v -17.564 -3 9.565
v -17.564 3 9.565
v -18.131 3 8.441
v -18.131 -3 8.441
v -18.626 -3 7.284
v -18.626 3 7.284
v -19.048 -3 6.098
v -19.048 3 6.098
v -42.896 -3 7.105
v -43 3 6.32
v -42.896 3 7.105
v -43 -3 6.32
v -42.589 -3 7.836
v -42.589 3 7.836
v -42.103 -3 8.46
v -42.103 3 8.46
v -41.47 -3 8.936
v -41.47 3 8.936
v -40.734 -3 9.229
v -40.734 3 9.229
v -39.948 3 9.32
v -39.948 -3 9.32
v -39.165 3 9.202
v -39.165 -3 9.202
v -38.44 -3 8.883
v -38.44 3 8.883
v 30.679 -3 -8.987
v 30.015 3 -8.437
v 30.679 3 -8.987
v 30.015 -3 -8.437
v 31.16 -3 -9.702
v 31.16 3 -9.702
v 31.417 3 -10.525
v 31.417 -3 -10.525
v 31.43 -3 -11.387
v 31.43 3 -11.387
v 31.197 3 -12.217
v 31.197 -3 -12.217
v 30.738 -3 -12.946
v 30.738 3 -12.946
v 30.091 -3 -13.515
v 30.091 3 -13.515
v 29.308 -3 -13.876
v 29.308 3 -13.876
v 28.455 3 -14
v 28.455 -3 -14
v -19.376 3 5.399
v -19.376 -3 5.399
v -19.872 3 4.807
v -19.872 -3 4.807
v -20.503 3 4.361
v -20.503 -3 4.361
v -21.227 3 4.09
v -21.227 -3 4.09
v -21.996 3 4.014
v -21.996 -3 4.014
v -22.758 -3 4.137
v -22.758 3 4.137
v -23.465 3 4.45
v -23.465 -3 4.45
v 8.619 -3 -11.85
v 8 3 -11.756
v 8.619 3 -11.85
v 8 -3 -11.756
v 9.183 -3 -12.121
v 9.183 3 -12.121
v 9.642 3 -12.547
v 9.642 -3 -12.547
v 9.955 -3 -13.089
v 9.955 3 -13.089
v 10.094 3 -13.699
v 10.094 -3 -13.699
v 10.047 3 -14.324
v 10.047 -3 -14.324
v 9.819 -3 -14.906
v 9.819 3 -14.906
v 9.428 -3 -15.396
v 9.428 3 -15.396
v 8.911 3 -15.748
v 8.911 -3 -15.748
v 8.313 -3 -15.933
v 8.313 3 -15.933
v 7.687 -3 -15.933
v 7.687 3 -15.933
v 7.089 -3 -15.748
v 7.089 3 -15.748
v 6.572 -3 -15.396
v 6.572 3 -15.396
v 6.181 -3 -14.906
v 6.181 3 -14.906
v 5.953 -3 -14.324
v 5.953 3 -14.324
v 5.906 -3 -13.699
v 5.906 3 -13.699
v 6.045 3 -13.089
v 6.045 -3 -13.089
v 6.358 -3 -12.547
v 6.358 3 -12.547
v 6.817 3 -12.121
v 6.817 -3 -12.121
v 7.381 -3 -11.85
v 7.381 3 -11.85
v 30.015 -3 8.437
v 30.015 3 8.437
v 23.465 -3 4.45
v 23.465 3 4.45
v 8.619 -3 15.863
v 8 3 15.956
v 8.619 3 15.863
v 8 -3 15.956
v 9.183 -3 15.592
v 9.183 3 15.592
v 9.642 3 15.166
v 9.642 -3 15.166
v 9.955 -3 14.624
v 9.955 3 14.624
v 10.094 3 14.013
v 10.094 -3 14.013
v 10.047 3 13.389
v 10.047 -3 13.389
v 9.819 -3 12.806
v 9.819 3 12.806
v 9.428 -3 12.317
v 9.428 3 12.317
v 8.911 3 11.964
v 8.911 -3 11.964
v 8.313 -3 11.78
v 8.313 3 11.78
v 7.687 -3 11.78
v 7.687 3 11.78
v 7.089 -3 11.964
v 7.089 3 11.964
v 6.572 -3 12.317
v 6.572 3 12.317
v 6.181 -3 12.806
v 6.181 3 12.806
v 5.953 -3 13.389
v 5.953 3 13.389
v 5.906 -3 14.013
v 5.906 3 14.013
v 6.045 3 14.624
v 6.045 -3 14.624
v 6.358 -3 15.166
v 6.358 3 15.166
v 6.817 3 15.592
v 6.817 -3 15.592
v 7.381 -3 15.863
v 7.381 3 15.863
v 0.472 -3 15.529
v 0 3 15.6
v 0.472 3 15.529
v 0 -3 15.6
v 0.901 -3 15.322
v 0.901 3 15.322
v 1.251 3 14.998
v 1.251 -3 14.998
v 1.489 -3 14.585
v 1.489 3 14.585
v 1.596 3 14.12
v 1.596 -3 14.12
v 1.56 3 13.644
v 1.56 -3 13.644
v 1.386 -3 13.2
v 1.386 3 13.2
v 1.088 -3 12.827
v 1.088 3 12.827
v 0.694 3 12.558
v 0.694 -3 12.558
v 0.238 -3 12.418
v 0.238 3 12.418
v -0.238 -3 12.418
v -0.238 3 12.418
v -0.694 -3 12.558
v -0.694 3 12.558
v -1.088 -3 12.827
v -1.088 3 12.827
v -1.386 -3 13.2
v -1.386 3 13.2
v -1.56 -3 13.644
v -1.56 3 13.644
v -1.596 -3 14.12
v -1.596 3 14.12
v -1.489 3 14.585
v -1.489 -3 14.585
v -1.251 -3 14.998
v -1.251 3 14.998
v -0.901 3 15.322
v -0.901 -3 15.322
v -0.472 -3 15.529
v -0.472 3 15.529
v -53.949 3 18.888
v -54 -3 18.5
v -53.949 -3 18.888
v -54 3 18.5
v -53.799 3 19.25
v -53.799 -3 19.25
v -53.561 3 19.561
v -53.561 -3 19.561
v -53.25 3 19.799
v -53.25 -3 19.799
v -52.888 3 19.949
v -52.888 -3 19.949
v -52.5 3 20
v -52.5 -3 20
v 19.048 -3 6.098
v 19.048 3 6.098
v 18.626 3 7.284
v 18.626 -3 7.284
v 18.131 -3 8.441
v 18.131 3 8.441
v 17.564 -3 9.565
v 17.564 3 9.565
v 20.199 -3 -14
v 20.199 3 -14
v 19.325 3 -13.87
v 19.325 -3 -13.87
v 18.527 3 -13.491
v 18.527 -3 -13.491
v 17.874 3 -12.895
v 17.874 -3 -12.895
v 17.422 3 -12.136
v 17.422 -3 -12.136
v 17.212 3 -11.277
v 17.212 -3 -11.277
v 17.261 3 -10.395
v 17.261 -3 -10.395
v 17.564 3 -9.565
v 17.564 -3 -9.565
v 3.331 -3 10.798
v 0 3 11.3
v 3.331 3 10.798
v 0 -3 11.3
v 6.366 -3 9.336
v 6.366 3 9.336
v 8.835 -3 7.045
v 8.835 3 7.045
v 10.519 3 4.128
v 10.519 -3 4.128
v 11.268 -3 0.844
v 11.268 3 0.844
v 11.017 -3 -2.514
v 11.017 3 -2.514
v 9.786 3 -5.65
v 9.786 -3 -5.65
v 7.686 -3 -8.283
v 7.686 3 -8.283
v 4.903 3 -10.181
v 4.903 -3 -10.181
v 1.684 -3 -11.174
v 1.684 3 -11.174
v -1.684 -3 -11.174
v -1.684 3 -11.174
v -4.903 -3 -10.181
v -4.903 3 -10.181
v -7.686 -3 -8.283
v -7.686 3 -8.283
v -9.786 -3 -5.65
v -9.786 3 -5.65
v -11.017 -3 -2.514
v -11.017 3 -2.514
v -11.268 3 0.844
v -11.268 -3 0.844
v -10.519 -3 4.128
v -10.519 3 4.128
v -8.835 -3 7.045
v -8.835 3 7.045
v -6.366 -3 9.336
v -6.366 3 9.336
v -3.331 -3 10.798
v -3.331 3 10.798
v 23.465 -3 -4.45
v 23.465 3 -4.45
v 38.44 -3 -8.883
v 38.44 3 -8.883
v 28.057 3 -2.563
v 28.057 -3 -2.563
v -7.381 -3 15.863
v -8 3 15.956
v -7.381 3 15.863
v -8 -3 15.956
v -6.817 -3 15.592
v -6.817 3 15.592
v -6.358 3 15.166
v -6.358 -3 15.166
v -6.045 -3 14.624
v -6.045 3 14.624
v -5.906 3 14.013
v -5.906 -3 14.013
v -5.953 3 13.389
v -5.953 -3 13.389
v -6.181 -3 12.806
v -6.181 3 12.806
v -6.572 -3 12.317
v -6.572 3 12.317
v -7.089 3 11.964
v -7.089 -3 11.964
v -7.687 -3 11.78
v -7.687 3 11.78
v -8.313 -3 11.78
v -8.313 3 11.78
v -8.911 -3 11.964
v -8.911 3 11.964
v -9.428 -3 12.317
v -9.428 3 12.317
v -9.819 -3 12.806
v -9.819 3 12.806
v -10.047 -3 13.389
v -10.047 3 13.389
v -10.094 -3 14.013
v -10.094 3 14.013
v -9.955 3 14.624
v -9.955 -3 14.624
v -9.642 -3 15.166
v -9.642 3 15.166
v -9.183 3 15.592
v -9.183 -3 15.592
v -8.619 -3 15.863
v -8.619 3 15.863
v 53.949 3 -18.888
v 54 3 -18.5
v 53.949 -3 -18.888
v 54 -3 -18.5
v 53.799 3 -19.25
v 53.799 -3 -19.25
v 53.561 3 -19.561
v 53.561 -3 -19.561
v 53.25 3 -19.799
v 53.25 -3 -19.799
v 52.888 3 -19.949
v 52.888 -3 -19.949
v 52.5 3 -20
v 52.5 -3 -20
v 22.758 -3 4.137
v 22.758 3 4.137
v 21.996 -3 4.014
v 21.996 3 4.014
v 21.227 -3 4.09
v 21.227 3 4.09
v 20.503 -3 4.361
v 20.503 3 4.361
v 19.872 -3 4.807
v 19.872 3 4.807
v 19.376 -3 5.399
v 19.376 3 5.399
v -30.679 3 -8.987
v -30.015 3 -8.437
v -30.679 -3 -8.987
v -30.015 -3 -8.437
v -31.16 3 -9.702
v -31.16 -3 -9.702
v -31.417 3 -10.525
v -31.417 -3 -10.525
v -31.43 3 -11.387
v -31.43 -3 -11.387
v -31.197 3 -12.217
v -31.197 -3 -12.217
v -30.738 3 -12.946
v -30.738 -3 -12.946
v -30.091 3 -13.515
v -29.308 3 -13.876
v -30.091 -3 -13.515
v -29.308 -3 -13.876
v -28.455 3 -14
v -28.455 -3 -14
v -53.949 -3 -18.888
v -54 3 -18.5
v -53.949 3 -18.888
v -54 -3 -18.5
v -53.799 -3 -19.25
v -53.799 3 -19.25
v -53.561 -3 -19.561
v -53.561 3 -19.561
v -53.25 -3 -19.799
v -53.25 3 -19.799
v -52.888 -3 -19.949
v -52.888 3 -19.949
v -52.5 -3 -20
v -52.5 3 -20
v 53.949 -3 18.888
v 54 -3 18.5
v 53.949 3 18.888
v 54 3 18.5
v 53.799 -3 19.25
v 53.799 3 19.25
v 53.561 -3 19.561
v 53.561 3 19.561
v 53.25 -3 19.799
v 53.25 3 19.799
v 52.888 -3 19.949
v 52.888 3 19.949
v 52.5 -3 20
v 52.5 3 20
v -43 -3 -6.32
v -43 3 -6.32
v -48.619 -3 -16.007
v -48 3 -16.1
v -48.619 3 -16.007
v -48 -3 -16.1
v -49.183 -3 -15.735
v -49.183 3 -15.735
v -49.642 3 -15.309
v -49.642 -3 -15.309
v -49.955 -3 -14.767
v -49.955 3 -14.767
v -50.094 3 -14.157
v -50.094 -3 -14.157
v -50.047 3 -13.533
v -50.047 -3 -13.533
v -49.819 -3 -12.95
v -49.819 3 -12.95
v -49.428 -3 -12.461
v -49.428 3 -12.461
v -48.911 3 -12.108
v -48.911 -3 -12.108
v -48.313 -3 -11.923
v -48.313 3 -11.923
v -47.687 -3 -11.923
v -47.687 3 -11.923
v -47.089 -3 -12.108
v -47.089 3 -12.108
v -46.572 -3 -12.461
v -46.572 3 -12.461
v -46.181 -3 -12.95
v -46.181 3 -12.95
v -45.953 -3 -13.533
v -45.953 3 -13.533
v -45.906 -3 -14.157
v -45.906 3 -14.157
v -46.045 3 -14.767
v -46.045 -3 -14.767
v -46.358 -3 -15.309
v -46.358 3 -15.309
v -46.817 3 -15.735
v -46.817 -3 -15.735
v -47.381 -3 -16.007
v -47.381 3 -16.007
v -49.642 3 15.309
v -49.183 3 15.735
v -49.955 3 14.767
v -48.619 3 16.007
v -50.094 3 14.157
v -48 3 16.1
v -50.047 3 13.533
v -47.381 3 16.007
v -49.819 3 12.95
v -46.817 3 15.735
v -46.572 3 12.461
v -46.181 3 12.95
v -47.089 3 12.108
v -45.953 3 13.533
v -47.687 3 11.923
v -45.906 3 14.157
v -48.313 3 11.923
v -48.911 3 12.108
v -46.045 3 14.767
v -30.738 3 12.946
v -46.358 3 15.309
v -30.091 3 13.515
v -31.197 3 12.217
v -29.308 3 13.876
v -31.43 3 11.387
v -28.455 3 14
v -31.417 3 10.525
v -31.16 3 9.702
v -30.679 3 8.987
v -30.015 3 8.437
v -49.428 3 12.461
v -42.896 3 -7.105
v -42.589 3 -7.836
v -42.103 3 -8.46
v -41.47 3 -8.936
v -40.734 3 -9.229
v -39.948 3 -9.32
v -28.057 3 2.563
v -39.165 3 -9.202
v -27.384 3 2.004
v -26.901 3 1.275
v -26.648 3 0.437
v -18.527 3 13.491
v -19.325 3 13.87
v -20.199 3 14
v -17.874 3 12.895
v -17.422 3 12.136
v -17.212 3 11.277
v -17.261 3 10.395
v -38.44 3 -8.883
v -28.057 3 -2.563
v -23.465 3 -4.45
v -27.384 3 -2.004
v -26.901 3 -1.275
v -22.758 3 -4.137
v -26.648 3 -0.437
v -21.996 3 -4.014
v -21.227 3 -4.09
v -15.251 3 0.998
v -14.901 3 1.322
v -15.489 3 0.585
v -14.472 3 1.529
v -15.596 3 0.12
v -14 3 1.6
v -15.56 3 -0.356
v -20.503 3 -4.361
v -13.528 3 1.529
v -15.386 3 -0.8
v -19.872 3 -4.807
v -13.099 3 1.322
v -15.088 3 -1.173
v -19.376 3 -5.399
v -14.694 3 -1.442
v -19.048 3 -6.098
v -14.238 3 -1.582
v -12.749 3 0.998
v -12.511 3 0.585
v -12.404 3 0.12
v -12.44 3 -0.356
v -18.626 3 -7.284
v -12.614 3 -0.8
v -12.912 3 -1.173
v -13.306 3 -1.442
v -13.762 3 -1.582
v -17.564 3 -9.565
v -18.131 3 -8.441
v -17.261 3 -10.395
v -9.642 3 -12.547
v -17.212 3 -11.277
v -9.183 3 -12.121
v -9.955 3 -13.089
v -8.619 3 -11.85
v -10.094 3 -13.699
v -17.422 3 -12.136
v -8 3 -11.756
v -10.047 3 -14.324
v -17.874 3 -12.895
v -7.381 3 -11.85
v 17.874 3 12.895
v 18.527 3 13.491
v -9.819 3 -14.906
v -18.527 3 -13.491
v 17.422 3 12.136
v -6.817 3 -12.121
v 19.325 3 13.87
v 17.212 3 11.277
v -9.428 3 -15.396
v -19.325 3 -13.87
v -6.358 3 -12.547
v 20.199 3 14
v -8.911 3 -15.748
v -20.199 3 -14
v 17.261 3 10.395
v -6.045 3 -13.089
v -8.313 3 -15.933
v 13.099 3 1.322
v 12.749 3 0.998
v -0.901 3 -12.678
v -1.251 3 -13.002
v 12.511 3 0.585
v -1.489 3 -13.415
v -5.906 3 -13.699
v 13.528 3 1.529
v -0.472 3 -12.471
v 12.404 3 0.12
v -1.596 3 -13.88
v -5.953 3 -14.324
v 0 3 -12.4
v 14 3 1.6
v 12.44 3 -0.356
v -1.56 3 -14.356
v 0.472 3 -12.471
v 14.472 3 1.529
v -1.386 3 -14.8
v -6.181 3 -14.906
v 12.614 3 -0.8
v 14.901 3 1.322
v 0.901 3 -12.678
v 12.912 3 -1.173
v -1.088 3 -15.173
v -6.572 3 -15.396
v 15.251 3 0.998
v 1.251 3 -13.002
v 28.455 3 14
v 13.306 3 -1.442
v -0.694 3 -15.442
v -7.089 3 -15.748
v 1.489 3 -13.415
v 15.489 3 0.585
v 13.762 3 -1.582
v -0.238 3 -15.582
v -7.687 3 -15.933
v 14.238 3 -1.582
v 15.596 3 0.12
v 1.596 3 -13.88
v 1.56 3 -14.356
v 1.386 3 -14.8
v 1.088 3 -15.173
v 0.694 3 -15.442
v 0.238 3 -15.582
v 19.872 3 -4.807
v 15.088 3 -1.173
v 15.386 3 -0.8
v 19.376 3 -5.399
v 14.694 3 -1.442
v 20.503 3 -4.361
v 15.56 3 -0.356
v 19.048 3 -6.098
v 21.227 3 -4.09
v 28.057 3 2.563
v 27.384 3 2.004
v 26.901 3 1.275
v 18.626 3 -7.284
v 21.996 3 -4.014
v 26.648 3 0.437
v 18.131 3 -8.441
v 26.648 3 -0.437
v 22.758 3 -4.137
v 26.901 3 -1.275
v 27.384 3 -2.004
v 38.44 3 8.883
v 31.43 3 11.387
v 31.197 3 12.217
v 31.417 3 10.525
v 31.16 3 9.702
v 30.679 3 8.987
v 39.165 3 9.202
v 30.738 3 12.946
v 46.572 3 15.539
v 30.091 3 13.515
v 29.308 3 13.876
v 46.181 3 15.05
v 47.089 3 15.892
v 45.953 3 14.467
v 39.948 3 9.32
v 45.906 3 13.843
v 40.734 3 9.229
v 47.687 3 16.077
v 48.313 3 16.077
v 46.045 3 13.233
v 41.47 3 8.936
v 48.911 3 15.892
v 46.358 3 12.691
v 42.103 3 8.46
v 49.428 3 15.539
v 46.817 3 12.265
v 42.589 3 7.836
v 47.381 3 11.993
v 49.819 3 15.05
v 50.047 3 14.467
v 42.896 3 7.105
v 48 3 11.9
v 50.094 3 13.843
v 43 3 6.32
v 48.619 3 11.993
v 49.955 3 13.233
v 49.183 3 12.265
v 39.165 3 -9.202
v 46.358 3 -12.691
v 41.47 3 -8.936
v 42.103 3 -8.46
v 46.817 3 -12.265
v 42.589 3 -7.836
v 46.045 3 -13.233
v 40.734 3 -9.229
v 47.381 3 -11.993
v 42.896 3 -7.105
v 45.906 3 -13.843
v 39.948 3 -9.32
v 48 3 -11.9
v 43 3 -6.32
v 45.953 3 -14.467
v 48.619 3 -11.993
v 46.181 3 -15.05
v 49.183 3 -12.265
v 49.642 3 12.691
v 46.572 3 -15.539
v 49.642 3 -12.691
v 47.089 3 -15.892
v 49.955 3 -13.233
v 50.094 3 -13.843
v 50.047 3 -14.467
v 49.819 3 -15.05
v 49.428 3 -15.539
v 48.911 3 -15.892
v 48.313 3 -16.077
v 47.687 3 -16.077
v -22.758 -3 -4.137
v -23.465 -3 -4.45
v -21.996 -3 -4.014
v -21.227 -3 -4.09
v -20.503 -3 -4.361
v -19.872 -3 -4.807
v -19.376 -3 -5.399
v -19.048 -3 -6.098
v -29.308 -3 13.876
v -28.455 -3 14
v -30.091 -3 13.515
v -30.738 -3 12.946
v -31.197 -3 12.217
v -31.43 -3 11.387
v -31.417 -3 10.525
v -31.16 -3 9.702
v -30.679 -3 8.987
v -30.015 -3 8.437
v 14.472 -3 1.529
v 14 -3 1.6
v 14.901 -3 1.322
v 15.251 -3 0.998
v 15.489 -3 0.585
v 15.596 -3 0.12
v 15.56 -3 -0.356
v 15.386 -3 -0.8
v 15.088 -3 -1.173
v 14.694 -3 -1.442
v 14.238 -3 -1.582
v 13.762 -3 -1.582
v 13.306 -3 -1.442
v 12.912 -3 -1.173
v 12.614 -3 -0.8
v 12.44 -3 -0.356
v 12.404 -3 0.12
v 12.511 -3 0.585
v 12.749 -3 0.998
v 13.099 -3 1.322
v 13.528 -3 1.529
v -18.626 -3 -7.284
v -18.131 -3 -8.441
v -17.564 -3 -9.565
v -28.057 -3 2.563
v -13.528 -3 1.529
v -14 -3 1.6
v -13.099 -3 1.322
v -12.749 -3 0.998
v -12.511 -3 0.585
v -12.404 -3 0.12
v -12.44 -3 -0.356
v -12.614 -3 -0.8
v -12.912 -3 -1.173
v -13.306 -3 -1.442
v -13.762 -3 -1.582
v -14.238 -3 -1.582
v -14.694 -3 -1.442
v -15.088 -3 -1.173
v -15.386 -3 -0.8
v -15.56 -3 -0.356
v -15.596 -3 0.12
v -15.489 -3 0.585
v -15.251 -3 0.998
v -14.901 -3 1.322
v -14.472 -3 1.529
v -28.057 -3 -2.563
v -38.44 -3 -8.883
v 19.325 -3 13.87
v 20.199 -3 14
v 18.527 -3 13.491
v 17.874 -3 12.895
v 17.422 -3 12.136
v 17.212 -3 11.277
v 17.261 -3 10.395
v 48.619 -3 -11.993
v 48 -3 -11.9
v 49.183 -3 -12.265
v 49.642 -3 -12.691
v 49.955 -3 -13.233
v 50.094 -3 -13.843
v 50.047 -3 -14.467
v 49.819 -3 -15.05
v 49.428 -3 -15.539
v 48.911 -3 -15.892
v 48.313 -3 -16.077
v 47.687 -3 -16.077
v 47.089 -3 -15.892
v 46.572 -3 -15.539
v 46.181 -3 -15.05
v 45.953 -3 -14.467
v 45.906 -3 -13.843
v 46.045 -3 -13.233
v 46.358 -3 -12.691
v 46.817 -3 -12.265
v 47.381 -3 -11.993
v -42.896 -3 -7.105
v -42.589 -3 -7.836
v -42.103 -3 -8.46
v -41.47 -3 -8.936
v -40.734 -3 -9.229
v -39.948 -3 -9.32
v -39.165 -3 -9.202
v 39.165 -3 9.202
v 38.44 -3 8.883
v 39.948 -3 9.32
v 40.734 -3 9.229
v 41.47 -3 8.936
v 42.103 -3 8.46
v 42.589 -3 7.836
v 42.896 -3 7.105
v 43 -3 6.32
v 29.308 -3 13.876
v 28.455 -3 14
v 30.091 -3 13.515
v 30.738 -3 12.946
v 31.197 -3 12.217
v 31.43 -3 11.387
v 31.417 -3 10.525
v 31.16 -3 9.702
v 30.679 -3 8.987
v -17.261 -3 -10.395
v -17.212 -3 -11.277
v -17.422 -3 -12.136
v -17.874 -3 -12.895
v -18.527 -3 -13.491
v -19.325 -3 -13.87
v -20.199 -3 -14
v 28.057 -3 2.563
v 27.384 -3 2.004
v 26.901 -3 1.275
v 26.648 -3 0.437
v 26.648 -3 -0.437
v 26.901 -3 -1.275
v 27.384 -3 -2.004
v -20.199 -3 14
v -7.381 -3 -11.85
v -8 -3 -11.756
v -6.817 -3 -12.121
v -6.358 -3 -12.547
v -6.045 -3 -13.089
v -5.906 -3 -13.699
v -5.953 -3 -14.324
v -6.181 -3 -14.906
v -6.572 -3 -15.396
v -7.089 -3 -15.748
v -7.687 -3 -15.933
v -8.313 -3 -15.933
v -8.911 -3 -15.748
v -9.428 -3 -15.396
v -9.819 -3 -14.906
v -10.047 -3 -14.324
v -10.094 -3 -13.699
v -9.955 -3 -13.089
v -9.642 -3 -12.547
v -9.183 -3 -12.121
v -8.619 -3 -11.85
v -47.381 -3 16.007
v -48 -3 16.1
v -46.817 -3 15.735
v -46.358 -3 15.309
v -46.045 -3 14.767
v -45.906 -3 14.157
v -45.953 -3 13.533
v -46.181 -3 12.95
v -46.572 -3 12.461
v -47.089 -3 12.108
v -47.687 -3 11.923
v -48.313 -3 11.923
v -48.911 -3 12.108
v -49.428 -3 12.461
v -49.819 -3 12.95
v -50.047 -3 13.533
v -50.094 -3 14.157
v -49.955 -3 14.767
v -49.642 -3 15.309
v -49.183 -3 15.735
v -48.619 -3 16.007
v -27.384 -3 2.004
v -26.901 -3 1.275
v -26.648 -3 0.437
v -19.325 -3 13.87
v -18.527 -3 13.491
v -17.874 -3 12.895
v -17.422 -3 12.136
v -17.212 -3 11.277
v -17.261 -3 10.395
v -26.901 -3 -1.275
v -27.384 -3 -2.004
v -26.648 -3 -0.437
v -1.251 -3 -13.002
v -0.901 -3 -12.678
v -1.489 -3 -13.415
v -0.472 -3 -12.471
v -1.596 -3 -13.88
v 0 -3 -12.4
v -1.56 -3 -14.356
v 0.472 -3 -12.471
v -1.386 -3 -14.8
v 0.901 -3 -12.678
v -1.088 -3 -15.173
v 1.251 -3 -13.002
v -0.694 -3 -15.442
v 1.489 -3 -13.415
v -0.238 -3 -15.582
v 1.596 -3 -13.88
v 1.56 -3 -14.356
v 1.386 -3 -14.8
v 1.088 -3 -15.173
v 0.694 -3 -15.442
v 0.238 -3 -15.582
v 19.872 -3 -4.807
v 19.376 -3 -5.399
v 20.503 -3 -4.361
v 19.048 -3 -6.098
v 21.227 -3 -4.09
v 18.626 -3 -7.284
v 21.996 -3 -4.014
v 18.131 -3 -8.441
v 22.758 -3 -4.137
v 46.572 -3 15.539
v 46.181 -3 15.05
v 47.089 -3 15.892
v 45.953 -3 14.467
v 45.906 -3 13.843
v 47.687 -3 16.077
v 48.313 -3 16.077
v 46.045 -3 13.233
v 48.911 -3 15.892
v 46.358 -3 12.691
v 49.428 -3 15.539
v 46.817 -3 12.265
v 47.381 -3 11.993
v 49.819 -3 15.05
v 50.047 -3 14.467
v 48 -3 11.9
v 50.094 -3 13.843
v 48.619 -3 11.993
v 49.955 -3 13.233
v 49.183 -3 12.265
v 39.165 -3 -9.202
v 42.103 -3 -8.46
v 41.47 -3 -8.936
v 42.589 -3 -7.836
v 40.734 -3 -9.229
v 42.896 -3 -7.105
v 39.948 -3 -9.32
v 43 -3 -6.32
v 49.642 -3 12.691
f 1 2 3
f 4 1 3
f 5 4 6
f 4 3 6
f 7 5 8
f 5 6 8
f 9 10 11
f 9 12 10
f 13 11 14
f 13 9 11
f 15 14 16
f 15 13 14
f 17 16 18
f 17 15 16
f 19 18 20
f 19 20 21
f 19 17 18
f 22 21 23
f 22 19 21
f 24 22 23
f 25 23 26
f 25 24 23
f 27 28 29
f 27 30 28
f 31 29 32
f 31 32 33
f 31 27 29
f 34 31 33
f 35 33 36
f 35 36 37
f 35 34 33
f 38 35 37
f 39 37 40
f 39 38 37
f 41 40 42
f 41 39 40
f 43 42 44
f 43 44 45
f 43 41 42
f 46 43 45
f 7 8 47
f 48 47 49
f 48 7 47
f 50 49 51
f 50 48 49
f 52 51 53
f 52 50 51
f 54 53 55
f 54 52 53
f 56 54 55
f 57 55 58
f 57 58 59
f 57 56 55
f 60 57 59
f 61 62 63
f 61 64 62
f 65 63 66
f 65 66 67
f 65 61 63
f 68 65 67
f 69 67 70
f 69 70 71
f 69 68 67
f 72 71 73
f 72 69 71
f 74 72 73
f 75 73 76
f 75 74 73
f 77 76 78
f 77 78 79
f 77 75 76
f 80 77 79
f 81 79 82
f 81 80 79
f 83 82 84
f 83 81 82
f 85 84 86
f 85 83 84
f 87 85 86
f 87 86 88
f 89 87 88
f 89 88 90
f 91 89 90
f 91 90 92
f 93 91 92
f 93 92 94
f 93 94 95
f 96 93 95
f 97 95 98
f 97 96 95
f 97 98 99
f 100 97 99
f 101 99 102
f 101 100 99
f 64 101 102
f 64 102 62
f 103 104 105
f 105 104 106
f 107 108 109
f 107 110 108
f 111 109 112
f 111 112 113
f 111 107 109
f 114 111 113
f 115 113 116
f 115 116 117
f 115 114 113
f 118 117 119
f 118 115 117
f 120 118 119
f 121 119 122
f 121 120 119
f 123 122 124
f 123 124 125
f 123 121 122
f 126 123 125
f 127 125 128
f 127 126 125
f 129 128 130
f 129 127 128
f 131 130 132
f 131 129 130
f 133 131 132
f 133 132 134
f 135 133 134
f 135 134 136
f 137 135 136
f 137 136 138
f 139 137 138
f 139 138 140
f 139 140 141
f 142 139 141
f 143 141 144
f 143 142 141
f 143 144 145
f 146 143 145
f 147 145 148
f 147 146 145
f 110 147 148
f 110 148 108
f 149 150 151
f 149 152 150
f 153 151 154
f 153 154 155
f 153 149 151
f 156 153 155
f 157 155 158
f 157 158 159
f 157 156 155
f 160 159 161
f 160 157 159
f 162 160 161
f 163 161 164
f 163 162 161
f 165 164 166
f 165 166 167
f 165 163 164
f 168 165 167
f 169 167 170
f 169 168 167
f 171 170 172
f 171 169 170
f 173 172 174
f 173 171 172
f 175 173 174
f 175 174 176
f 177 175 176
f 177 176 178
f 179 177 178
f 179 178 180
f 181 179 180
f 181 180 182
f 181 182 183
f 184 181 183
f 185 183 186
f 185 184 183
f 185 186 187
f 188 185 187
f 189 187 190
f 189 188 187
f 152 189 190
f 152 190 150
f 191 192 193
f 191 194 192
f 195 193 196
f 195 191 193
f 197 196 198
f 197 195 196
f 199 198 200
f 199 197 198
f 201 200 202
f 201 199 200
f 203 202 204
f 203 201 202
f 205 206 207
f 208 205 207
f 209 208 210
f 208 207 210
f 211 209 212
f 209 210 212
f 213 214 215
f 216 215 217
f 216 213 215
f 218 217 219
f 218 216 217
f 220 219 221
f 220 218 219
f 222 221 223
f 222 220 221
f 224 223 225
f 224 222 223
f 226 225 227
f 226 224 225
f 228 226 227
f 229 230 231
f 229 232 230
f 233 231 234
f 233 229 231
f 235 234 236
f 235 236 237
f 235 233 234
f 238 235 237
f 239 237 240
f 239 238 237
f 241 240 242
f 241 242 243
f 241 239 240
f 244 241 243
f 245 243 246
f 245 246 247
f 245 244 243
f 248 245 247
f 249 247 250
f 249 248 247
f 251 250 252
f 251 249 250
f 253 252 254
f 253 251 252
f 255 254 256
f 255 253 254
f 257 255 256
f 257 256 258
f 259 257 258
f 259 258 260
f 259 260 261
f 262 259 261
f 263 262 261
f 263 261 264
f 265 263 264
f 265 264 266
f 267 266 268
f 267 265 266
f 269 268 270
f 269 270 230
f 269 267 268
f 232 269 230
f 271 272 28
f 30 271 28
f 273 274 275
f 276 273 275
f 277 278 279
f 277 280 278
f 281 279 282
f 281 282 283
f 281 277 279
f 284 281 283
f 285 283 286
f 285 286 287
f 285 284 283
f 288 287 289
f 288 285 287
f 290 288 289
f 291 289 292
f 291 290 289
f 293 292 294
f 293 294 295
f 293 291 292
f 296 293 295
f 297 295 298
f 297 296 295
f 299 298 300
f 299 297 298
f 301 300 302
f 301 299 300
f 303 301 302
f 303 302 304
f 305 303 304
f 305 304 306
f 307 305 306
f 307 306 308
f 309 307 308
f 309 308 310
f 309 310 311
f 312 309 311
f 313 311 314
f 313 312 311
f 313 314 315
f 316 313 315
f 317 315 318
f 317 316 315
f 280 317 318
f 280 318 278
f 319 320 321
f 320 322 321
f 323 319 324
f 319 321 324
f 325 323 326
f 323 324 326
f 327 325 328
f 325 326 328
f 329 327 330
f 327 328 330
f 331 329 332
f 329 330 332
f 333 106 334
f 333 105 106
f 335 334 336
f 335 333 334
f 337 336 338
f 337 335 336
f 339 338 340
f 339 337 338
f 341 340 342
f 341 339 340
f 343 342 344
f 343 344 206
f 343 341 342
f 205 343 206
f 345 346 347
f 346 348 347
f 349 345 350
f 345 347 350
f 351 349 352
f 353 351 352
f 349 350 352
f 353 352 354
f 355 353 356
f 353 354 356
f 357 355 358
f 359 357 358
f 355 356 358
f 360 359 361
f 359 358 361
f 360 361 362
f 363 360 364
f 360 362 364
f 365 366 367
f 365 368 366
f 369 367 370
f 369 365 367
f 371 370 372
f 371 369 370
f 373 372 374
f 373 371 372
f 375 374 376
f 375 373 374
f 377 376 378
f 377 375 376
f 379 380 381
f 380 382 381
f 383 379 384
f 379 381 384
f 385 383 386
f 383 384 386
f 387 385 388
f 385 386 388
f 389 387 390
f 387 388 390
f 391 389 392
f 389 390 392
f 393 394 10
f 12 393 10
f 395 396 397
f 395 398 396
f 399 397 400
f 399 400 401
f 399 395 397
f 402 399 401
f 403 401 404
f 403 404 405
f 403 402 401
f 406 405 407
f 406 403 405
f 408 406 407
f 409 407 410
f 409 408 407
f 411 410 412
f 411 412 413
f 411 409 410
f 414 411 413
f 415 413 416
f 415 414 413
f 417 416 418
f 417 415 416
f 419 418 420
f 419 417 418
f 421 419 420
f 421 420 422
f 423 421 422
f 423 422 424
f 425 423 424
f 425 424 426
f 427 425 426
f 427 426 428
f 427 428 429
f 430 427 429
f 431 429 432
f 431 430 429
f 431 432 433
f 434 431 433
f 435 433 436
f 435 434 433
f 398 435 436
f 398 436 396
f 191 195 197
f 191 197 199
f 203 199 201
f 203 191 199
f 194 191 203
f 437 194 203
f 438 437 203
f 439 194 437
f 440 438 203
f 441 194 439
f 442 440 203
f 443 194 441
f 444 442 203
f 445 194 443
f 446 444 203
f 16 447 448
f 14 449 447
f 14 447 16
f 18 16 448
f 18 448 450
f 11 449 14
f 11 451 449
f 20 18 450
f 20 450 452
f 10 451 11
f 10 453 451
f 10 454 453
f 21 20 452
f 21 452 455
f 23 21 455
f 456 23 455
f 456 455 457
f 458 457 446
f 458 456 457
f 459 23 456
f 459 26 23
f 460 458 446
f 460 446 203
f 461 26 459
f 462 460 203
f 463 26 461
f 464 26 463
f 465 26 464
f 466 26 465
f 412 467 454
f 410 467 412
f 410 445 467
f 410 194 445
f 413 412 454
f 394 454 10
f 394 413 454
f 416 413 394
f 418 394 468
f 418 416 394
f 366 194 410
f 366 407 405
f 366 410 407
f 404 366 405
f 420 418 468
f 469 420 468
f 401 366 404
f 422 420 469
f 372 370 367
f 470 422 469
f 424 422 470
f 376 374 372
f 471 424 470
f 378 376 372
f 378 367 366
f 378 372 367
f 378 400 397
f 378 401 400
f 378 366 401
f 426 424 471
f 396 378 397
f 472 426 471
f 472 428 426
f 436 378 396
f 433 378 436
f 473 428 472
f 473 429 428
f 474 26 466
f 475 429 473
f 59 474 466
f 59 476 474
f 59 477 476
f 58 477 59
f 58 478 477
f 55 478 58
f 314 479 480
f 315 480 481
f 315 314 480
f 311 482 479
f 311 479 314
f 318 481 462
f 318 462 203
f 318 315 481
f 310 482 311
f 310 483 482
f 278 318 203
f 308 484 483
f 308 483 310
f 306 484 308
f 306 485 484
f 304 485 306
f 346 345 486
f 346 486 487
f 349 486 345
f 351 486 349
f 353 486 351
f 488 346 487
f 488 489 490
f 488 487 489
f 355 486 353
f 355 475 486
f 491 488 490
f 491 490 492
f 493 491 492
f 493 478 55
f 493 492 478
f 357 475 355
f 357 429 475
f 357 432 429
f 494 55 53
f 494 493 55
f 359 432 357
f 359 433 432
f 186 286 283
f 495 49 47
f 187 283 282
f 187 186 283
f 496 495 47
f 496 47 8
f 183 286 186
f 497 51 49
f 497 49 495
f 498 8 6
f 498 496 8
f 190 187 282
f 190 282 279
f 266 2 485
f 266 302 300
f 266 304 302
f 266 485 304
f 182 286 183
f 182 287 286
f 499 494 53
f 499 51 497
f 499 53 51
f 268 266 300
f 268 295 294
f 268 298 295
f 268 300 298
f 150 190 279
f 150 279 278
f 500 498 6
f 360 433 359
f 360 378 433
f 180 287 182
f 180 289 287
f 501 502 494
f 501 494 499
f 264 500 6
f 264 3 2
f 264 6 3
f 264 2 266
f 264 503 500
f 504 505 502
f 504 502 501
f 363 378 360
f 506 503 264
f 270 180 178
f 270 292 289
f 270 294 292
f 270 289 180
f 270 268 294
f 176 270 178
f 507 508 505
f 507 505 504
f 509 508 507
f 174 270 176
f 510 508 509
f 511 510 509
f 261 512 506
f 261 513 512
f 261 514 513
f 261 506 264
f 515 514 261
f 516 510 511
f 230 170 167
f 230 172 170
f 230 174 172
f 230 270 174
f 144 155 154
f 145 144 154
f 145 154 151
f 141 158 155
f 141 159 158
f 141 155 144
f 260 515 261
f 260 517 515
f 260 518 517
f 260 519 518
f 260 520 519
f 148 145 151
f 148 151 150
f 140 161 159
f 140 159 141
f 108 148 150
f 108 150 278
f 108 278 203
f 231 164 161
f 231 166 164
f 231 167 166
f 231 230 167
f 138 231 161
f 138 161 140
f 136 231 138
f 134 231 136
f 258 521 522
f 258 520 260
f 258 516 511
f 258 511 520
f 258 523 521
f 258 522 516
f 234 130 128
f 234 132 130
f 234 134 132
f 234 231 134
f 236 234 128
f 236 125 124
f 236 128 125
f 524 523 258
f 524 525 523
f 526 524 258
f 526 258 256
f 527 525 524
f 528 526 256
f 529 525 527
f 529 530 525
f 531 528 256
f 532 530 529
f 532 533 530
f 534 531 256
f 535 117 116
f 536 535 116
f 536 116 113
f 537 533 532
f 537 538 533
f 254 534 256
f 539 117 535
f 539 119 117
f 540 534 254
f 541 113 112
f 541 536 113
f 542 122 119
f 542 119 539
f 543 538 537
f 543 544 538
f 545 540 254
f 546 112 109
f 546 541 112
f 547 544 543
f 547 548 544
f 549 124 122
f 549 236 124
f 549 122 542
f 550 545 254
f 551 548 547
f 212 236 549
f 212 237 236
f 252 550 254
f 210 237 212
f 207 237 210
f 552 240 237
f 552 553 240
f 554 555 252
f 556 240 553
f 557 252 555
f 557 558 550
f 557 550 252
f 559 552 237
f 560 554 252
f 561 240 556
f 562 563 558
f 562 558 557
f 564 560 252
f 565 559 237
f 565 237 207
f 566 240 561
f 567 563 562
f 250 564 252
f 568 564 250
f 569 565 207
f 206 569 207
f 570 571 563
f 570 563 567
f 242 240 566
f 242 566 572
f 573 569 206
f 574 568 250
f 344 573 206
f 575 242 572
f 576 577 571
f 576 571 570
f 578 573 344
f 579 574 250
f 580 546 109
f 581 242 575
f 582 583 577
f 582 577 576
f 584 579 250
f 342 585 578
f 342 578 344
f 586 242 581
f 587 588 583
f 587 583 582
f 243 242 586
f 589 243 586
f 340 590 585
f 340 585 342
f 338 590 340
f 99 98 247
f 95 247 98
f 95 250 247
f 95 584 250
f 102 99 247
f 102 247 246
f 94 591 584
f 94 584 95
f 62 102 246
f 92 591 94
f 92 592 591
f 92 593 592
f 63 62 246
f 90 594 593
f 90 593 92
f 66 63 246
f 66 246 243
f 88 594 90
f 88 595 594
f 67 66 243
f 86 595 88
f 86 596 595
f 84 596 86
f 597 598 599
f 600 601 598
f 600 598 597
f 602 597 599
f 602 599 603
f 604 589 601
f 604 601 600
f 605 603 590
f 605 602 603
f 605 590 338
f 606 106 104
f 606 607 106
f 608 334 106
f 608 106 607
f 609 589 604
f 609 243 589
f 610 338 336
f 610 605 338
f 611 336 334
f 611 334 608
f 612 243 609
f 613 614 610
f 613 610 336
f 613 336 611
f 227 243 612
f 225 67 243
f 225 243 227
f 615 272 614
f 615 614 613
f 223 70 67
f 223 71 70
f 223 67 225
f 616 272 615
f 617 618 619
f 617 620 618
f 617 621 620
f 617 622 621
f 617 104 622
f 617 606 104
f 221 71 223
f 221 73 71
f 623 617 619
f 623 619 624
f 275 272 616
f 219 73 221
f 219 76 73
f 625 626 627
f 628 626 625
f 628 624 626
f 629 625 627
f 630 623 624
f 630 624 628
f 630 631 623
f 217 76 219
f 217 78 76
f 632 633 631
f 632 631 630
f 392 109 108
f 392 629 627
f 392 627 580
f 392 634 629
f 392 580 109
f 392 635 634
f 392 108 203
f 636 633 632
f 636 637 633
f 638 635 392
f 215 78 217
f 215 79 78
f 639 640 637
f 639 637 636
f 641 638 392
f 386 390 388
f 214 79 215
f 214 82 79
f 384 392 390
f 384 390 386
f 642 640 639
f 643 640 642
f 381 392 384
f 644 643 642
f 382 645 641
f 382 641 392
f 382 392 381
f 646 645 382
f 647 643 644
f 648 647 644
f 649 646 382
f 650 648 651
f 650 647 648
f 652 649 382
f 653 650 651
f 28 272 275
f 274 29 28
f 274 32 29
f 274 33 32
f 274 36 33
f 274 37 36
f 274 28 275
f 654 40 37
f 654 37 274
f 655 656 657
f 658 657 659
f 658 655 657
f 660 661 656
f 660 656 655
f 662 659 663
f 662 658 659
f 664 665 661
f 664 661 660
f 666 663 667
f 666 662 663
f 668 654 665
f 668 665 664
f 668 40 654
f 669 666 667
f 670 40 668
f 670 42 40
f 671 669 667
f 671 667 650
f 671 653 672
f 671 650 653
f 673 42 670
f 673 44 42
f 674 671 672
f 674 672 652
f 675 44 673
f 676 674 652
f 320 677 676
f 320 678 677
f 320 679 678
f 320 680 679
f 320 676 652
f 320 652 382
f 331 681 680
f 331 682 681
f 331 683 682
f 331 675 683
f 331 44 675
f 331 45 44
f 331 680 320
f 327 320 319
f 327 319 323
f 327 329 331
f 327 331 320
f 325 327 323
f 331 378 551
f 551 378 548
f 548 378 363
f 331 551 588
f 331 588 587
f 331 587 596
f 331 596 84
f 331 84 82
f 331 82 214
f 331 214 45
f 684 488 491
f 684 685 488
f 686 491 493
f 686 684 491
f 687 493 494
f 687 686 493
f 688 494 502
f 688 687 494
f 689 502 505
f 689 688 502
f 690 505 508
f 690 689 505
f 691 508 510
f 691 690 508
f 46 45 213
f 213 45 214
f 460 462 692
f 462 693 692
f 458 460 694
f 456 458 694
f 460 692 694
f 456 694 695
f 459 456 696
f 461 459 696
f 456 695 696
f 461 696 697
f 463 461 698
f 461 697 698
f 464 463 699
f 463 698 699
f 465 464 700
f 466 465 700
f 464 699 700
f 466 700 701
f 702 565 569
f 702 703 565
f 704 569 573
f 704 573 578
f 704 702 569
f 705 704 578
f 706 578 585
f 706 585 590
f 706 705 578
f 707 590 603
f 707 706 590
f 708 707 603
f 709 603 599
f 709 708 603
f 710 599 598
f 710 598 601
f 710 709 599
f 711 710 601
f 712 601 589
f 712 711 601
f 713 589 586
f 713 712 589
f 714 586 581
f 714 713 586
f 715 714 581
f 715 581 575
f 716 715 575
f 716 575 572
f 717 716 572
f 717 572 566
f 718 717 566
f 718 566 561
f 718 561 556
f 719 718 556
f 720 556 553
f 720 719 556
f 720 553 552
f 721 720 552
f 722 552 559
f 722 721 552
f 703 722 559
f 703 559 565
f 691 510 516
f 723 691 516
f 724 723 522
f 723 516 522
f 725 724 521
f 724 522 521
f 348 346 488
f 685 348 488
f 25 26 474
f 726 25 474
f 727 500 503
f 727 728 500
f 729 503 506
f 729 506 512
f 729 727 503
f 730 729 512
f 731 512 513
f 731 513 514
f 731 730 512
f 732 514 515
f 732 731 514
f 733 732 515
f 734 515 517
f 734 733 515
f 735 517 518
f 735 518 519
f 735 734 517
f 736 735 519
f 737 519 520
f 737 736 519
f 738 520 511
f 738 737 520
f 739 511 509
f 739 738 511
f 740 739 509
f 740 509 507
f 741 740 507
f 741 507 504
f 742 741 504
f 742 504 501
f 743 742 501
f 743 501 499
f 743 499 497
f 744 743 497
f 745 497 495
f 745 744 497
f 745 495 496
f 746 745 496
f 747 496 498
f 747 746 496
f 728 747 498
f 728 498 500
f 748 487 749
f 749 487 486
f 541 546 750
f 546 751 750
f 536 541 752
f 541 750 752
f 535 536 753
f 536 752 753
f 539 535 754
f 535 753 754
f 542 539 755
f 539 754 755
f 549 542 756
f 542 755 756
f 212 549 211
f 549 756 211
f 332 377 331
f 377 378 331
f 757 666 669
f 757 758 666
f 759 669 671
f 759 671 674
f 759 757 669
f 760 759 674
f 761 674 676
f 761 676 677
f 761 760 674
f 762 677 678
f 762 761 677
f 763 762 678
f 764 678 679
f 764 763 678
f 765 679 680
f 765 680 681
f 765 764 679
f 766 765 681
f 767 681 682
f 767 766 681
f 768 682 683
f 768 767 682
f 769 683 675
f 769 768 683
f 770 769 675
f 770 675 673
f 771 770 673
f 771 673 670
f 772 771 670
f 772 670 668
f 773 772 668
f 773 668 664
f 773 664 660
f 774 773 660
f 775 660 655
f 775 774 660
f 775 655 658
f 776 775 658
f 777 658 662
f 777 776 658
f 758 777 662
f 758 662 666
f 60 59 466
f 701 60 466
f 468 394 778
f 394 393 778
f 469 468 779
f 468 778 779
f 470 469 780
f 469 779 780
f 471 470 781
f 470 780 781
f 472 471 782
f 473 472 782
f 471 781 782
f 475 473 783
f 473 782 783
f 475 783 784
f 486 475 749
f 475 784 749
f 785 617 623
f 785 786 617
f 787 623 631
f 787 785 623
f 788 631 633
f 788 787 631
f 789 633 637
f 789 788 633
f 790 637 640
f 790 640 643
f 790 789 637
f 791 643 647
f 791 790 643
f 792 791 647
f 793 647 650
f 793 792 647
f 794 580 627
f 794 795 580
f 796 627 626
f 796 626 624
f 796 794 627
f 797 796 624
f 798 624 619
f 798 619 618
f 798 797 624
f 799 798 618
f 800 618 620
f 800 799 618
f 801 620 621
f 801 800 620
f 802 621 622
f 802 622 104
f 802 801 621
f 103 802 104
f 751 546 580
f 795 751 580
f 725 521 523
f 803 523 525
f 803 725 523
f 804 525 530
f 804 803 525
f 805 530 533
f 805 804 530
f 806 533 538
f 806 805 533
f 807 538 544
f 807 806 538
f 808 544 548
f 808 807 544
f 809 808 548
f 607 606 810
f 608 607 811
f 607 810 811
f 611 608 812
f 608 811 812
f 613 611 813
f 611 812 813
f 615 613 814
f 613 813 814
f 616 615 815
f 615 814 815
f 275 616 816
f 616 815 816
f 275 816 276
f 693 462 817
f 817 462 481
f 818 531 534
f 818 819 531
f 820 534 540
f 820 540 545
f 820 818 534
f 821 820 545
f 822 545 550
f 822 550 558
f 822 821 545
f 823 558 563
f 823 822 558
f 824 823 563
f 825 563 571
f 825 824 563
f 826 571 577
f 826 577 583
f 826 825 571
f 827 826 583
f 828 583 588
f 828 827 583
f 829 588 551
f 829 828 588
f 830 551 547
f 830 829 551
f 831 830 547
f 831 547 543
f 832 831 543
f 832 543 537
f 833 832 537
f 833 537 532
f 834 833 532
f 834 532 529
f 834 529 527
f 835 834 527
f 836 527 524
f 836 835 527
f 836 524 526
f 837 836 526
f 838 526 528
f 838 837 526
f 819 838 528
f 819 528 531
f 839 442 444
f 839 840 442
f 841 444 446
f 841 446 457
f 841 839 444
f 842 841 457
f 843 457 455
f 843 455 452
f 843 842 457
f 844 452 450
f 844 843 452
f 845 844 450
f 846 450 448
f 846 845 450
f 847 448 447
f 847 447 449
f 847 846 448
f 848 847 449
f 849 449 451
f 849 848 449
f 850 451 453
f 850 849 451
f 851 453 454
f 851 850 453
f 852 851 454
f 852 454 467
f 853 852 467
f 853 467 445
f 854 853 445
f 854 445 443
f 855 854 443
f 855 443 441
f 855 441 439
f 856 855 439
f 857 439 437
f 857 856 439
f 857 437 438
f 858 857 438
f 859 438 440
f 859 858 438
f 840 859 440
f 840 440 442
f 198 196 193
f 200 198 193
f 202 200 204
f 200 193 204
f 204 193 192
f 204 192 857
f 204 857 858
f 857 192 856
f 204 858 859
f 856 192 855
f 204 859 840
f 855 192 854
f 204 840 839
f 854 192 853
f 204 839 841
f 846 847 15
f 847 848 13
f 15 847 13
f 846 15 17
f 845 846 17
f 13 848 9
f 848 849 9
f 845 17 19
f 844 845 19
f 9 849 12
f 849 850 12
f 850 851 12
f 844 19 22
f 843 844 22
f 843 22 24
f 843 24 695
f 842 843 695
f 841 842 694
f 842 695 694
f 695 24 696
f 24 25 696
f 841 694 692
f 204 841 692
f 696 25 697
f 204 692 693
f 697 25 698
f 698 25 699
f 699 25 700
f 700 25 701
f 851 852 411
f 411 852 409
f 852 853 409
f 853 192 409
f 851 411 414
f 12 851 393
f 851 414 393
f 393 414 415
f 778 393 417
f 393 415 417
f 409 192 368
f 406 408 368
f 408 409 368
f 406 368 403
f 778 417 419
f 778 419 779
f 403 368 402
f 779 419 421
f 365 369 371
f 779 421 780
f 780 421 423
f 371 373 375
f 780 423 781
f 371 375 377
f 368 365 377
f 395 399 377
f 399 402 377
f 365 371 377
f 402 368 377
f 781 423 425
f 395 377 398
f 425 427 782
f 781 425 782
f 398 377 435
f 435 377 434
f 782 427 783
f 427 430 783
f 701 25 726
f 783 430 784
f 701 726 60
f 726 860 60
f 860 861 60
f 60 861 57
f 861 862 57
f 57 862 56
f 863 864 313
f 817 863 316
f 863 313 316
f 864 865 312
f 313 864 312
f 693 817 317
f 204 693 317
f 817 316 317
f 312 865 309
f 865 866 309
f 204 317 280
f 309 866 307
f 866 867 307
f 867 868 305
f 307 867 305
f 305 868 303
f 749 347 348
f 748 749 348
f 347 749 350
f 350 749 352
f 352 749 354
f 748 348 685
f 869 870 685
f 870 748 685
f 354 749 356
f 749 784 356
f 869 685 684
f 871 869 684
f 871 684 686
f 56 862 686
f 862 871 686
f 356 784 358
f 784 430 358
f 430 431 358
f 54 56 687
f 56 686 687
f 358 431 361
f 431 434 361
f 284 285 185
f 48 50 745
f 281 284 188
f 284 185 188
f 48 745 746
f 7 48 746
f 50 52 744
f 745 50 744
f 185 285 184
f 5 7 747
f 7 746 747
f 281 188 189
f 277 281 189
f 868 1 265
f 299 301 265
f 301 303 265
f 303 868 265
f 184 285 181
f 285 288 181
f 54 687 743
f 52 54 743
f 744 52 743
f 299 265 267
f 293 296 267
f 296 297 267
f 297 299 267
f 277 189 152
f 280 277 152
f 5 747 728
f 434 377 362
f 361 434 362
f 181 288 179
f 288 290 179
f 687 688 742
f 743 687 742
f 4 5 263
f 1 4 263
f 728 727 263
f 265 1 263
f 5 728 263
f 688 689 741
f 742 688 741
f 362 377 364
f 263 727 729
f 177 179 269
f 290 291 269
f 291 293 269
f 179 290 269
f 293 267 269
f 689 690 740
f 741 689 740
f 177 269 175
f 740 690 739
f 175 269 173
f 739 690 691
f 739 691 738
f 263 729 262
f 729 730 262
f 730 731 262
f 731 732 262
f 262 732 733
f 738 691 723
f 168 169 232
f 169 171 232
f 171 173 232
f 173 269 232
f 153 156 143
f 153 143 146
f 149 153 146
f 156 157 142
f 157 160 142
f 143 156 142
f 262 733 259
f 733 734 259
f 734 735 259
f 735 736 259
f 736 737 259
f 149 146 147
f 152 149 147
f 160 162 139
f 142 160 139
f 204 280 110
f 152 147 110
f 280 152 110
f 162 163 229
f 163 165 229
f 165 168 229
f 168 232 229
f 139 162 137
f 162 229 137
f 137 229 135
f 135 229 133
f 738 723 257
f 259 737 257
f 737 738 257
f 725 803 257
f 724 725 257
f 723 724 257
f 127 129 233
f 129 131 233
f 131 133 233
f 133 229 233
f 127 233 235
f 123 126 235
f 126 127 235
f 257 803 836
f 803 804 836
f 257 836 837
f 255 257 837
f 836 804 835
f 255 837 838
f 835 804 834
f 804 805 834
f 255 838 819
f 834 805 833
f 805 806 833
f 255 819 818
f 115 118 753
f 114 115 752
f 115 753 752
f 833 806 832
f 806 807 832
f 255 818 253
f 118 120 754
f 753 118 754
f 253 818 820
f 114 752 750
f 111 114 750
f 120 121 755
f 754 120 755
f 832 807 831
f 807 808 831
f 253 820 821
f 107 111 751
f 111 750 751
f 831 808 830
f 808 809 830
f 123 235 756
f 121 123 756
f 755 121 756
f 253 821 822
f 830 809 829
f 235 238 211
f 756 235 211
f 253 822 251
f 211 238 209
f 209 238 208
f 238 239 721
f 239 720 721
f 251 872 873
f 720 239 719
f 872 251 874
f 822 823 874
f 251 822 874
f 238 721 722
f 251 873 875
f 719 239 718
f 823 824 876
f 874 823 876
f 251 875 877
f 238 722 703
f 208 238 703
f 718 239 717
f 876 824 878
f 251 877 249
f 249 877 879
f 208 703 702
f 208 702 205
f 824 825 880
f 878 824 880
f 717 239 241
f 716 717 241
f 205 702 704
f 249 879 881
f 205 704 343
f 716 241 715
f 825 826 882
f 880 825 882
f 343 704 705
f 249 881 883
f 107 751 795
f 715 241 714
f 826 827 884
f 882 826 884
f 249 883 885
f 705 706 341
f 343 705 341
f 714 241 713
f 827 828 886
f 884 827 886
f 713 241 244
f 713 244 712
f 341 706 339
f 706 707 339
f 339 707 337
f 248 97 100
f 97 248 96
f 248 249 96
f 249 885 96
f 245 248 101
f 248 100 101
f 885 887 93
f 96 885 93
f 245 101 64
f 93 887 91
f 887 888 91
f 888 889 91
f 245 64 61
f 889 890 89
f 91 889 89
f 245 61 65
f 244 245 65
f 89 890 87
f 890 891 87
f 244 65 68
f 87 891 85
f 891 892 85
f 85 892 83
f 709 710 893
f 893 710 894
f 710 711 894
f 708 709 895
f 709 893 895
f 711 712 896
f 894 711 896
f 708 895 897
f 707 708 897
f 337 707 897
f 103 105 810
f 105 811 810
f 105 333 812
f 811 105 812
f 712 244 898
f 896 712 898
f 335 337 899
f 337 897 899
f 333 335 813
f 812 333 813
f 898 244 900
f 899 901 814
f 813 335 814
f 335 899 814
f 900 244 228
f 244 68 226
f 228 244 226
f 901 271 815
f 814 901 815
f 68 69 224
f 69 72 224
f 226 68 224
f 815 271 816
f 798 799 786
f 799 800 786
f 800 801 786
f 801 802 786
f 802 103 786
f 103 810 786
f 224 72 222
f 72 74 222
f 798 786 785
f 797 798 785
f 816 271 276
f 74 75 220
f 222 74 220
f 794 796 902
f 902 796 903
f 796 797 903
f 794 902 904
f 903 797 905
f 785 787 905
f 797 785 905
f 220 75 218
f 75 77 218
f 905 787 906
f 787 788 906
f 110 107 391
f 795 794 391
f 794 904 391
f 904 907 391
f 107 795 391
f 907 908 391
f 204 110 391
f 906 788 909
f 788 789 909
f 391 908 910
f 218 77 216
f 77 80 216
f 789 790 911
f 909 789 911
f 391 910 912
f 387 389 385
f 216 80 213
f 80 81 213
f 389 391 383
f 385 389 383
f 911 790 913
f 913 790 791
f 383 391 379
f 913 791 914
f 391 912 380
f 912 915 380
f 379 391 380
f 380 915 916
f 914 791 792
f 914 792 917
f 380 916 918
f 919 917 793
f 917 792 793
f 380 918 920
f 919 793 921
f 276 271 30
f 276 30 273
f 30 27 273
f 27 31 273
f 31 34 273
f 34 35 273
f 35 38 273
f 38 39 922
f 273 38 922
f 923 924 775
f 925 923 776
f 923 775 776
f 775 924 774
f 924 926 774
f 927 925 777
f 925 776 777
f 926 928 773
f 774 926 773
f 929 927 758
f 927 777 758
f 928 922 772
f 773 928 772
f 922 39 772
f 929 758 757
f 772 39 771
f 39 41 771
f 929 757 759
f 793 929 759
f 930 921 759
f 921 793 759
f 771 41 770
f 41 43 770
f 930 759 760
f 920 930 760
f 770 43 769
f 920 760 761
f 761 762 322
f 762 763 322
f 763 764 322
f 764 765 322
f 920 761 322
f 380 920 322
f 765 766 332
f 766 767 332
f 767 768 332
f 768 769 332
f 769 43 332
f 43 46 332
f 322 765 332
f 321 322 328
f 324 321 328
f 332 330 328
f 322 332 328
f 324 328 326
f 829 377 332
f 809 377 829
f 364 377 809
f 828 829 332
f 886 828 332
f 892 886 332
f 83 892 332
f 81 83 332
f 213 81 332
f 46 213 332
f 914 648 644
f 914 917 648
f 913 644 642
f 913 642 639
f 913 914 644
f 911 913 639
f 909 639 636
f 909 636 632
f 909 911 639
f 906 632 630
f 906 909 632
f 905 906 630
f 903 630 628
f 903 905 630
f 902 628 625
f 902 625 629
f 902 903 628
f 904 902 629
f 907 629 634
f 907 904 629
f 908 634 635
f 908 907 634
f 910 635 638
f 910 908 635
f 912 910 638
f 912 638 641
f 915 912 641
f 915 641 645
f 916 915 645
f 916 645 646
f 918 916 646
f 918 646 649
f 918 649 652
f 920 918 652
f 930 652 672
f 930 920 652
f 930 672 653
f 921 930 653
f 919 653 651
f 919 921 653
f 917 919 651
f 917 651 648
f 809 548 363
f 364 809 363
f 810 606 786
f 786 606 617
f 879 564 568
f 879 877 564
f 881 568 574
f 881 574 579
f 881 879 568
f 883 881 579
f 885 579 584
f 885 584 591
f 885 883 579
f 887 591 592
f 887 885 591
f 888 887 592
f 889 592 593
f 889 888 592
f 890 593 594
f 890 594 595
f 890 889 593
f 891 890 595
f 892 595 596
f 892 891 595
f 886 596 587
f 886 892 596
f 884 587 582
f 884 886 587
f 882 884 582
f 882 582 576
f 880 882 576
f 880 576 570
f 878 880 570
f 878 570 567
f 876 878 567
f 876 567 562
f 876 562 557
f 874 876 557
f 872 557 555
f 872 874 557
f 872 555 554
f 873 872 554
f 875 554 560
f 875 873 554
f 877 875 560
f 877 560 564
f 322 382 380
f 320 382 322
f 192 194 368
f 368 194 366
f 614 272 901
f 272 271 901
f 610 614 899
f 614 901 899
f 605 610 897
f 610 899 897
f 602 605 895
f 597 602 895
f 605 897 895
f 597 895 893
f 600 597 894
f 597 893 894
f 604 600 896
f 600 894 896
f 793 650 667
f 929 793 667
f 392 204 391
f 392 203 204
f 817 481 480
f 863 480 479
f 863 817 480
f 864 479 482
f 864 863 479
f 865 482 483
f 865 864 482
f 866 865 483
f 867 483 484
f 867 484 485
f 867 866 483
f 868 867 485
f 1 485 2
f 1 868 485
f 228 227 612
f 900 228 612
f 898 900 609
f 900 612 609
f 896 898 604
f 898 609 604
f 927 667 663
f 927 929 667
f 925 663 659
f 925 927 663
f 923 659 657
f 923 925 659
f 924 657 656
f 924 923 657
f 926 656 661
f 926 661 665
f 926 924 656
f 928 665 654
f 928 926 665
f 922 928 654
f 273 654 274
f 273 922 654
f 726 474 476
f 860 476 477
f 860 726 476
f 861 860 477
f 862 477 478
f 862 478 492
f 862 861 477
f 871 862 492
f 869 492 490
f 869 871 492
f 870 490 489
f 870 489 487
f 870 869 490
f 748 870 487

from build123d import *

# Parameters (mm, degrees)
SKETCH_1_W          = 108
SKETCH_1_H          = 40
SKETCH_1_R          = 11.3
SKETCH_1_R_2        = 1.6
SKETCH_1_R_3        = 2.1
EXTRUDE_1_DEPTH     = 3
FILLET_1_R          = 1.5
CUT_EXTRUDE_1_DEPTH = 58.896459305
FILLET_2_R          = 3


with BuildPart() as part:
    # 草图1 → 凸台-拉伸1 (new, symmetric)
    with BuildSketch(Plane(origin=(0, 0, 0), x_dir=(1, 0, 0), z_dir=(0, 1, 0))):
        Rectangle(SKETCH_1_W, SKETCH_1_H)
        with Locations(Location((0, 0, 0), (0, 0, 270))):
            Circle(SKETCH_1_R, mode=Mode.SUBTRACT)
        with Locations(Location((0, 14, 0), (0, 0, 270))):
            Circle(SKETCH_1_R_2, mode=Mode.SUBTRACT)
        with Locations(Location((8, 13.856406461, 0), (0, 0, 270))):
            Circle(SKETCH_1_R_3, mode=Mode.SUBTRACT)
        with Locations(Location((8, -13.856406461, 0), (0, 0, 270))):
            Circle(SKETCH_1_R_3, mode=Mode.SUBTRACT)
        with Locations(Location((-8, -13.856406461, 0), (0, 0, 270))):
            Circle(SKETCH_1_R_3, mode=Mode.SUBTRACT)
        with Locations(Location((-8, 13.856406461, 0), (0, 0, 270))):
            Circle(SKETCH_1_R_3, mode=Mode.SUBTRACT)
        with Locations(Location((14, 0, 0), (0, 0, 270))):
            Circle(SKETCH_1_R_2, mode=Mode.SUBTRACT)
        with Locations(Location((0, -14, 0), (0, 0, 270))):
            Circle(SKETCH_1_R_2, mode=Mode.SUBTRACT)
        with Locations(Location((-14, 0, 0), (0, 0, 270))):
            Circle(SKETCH_1_R_2, mode=Mode.SUBTRACT)
        with Locations(Location((-48, -14, 0), (0, 0, 270))):
            Circle(SKETCH_1_R_3, mode=Mode.SUBTRACT)
        with Locations(Location((-48, 14, 0), (0, 0, 90))):
            Circle(SKETCH_1_R_3, mode=Mode.SUBTRACT)
        with Locations(Location((48, -14, 0), (0, 0, 90))):
            Circle(SKETCH_1_R_3, mode=Mode.SUBTRACT)
        with Locations(Location((48, 14, 0), (0, 0, 270))):
            Circle(SKETCH_1_R_3, mode=Mode.SUBTRACT)
    extrude(amount=EXTRUDE_1_DEPTH, both=True)

    # 圆角1
    fillet_1_edges = [part.edges().sort_by_distance(p)[0] for p in [
        (54, 0, 20),
        (-54, 0, 20),
        (-54, 0, -20),
        (54, 0, -20),
    ]]
    fillet(fillet_1_edges, radius=FILLET_1_R)

    # 草图3 → 切除-拉伸1 (cut, through all)
    with BuildSketch(Plane(origin=(0, 3, 0), x_dir=(1, 0, 0), z_dir=(0, 1, 0))):
        with BuildLine():
            Line((-39.153453709, 14), (-19.871537669, 2.263181541))
            ThreePointArc((-19.871537669, 2.263181541), (-18.057377806, 8.598319996), (-14.282856857, 14))
            Line((-14.282856857, 14), (-39.153453709, 14))
        make_face()
        Polygon((-43, 11.658623997), (-43, -11.658623997), (-23.846546291, 0), align=None)
        with BuildLine():
            Line((-39.153453709, -14), (-14.282856857, -14))
            ThreePointArc((-14.282856857, -14), (-18.057377806, -8.598319996), (-19.871537669, -2.263181541))
            Line((-19.871537669, -2.263181541), (-39.153453709, -14))
        make_face()
        with BuildLine():
            Line((14.282856857, -14), (39.153453709, -14))
            Line((39.153453709, -14), (19.871537669, -2.263181541))
            ThreePointArc((19.871537669, -2.263181541), (18.057377806, -8.598319996), (14.282856857, -14))
        make_face()
        Polygon((23.846546291, 0), (43, -11.658623997), (43, 11.658623997), align=None)
        with BuildLine():
            ThreePointArc((14.282856857, 14), (18.057377806, 8.598319996), (19.871537669, 2.263181541))
            Line((19.871537669, 2.263181541), (39.153453709, 14))
            Line((39.153453709, 14), (14.282856857, 14))
        make_face()
    extrude(amount=-CUT_EXTRUDE_1_DEPTH, mode=Mode.SUBTRACT)

    # 圆角2
    fillet_2_edges = [part.edges().sort_by_distance(p)[0] for p in [
        (-19.871537669, 0, 2.263181541),
        (-14.282856857, 0, 14),
        (-39.153453709, 0, 14),
        (-23.846546291, 0, 0),
        (-43, 0, 11.658623997),
        (-43, 0, -11.658623997),
        (23.846546291, 0, 0),
        (43, 0, -11.658623997),
        (43, 0, 11.658623997),
        (14.282856857, 0, 14),
        (19.871537669, 0, 2.263181541),
        (39.153453709, 0, 14),
        (19.871537669, 0, -2.263181541),
        (14.282856857, 0, -14),
        (39.153453709, 0, -14),
        (-14.282856857, 0, -14),
        (-19.871537669, 0, -2.263181541),
        (-39.153453709, 0, -14),
    ]]
    fillet(fillet_2_edges, radius=FILLET_2_R)


solid = part.part
